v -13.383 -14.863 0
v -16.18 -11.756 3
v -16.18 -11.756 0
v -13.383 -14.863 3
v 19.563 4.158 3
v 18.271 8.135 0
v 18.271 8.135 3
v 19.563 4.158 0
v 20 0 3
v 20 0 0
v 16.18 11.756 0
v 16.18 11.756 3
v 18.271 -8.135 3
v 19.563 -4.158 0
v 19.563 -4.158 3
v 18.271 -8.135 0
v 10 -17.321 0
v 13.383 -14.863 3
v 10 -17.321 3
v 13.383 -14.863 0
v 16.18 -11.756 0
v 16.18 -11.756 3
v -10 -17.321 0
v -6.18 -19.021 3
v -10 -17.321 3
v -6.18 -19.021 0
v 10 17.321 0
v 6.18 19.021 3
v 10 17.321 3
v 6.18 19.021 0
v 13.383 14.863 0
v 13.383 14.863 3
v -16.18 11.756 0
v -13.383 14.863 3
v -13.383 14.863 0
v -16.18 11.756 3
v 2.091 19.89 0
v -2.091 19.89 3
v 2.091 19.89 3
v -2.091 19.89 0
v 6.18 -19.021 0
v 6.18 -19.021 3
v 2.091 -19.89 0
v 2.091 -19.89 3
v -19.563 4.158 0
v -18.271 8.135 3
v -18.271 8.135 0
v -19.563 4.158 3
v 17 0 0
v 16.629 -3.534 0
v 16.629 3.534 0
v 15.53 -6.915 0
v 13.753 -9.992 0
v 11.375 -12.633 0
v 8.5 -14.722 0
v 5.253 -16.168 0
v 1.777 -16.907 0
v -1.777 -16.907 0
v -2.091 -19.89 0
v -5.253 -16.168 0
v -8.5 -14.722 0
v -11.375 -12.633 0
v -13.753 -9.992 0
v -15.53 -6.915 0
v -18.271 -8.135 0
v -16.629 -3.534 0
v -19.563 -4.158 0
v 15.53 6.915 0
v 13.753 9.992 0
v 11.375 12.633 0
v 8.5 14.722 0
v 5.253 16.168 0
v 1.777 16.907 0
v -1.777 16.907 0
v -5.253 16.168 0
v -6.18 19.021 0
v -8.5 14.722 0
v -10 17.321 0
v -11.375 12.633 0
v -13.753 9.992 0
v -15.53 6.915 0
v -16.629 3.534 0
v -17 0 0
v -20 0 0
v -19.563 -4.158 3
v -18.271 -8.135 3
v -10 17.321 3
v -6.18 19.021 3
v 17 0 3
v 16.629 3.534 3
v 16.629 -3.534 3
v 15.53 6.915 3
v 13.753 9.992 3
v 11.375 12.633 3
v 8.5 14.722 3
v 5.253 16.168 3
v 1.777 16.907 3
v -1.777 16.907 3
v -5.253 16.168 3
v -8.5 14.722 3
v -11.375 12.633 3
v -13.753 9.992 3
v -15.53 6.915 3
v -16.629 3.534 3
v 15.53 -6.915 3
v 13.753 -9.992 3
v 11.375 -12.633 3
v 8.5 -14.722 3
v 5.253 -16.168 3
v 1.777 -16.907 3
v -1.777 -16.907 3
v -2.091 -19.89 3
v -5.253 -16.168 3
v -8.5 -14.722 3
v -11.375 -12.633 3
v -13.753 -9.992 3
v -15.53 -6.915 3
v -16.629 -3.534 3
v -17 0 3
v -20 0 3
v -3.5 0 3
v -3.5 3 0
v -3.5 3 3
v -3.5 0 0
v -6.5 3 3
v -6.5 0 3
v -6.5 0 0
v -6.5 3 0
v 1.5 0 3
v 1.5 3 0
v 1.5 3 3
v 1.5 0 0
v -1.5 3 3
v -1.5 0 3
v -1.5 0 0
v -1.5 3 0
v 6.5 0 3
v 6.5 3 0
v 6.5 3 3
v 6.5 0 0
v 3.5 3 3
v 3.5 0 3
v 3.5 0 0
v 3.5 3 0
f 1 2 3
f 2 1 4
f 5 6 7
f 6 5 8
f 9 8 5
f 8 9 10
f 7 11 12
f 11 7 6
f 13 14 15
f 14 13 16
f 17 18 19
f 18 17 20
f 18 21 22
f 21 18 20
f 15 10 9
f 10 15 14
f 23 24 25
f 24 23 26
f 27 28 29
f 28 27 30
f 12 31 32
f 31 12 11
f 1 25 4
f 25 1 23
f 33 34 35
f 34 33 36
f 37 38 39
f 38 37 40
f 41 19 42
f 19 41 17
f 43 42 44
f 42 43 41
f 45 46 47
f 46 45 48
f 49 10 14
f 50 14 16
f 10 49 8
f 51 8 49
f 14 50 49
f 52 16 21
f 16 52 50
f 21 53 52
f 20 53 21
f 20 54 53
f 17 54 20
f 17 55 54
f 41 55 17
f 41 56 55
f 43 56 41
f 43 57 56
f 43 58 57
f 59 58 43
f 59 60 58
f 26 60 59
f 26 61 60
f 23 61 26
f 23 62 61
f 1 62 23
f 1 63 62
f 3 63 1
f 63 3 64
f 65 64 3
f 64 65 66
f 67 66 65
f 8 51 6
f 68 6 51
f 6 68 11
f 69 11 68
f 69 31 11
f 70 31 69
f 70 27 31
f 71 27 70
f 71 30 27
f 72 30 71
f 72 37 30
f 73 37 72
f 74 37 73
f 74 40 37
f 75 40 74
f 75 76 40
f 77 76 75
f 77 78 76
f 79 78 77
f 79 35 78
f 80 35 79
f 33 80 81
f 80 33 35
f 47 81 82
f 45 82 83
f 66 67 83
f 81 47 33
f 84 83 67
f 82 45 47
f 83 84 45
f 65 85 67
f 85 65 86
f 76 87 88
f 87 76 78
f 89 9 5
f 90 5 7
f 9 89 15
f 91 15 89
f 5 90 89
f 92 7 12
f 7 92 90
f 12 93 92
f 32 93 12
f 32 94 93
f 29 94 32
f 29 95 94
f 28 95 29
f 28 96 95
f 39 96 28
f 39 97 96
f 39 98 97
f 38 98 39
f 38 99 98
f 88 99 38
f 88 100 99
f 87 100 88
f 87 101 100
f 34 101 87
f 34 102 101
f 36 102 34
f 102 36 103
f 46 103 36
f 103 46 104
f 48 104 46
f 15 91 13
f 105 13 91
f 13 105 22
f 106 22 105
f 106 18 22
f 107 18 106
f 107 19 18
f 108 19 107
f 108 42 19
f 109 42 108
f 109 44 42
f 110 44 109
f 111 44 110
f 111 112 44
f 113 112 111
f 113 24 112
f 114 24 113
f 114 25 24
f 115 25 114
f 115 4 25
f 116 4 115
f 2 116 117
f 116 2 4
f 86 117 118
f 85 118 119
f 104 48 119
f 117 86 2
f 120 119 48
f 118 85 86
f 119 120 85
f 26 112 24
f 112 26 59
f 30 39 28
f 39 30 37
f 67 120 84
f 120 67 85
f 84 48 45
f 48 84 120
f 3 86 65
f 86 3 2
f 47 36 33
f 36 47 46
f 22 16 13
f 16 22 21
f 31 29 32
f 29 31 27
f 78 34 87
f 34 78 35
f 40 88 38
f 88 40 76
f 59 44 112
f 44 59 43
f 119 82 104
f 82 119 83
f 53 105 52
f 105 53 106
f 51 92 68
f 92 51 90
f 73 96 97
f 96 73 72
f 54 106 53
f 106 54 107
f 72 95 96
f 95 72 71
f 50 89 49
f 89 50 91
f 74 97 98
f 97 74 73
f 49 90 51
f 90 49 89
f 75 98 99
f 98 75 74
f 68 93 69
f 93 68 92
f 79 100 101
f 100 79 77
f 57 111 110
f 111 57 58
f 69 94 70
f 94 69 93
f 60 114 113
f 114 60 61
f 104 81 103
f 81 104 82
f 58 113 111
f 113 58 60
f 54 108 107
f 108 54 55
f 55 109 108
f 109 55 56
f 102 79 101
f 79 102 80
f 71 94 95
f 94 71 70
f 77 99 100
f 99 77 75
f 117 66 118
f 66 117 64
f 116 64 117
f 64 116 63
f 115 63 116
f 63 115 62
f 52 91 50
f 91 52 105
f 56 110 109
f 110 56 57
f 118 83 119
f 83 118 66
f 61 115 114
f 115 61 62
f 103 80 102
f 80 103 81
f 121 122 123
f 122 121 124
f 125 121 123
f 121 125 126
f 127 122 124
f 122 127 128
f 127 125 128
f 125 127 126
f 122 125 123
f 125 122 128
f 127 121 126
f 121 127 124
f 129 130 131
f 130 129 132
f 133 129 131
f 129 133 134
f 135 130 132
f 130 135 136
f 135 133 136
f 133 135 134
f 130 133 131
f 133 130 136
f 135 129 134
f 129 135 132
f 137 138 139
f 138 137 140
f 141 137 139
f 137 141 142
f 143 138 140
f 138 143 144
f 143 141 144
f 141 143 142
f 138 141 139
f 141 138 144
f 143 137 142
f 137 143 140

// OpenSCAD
difference() {
	cylinder(h=3, r=20);
	translate([0, 0, -1]) {
		cylinder(h=5, r=17);
	}
}

translate([-6.5, 0, 0]) {
	cube(3);
}
translate([-1.5, 0, 0]) {
	cube(3);
}
translate([3.5, 0, 0]) {
	cube(3);
}
